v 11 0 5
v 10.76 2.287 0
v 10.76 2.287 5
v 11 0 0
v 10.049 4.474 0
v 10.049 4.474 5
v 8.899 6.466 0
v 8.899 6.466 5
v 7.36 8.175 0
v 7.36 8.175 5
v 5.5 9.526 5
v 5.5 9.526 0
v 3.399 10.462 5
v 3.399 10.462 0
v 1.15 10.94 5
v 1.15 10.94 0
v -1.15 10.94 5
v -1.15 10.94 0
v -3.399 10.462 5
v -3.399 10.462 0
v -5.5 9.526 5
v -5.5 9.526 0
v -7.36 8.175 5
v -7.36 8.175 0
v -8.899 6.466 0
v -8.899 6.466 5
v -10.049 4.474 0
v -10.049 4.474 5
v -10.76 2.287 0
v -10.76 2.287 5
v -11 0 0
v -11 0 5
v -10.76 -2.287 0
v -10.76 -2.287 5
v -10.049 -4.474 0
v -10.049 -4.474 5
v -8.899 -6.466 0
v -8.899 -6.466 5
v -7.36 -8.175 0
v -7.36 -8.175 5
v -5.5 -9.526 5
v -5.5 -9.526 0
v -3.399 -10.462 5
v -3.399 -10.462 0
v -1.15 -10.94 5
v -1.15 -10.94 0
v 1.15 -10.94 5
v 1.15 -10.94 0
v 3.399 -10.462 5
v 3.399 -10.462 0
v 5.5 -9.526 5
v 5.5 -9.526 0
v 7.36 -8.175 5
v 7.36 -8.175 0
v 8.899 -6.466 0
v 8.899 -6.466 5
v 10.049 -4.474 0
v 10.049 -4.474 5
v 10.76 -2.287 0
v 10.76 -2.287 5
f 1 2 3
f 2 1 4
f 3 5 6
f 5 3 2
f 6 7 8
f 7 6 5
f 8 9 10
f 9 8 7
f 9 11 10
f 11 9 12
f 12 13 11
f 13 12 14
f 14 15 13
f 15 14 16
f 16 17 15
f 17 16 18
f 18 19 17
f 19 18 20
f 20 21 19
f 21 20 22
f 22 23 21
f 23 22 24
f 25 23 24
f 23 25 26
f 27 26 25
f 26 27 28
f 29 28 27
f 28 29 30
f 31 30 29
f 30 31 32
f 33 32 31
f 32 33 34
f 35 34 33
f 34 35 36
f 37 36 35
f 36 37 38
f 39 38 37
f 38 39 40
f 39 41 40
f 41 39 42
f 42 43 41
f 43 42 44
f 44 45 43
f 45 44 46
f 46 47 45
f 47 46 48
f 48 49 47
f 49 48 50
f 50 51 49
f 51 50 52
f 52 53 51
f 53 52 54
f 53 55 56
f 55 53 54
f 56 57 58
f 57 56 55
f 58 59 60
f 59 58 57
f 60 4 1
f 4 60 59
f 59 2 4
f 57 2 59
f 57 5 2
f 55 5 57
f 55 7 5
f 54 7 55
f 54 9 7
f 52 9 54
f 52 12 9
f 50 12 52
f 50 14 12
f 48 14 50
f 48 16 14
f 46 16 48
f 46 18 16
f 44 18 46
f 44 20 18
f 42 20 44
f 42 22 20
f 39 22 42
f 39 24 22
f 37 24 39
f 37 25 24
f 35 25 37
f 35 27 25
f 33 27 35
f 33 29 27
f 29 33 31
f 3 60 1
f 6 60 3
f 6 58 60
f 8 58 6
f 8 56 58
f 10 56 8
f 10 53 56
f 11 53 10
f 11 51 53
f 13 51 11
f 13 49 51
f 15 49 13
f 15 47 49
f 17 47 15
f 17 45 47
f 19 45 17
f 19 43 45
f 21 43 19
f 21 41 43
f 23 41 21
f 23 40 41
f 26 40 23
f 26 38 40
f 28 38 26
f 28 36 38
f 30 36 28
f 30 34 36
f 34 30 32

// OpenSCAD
// Generated by SolidPython 1.0.1 on 2020-07-29 00:46:44


cylinder(h = 5, r1 = 11, r2 = 11);
/***********************************************
*********      SolidPython code:      **********
************************************************
 
# import packages: SolidPython
from solid import *
from solid.utils import *
from itertools import chain, combinations, permutations


class Resize:

    def __init__(self, scad_file):
        self.scad_file = scad_file
        #self.scad_file = import_scad(scad_file)
        # cone/cylinder param:
        self.r1 = 0
        self.r2 = 0
        self.h = 0
        # rectangular prism param:
        self.w = 0
        self.l = 0
        # ellipse param:
        self.r = 0

    # import OpenScad code (file name corresponds to shape)


    # classify shape + parameters
    def assign(self, param1, param2, param3):
        if self.scad_file == 'cone.scad':
            self.r1 = param1
            self.r2 = param2
            self.h = param3
        elif self.scad_file == 'cylinder.scad':
            self.r1 = param1
            self.r2 = param2
            self.h = param3
        elif self.scad_file == 'rectangularPrism.scad':
            self.h = param1
            self.l = param2
            self.w = param3
        else:
            self.r = param1
            self.h = param2

    # resize parameters
    def iterate(self):
        x = range(3, 20, 2)
        i = 1
        if self.scad_file == 'cone.scad':
            tempList = list(permutations(x, 2))
            for temp in tempList:
                param1 = temp[0]
                param2 = temp[1]
                filepath = 'produced_scad_files/' + 'cone' + str(param1) + '_' + str(param2) + '_' + '.scad'
                scad_render_to_file(cylinder(h=param1, r1=param2, r2=0), filepath)

        elif self.scad_file == 'cylinder.scad':
            tempList = list(permutations(x, 3))
            for temp in tempList:
                param1 = temp[0]
                param2 = temp[1]
                filepath = 'produced_scad_files/' + 'cylinder' + str(param1) + '_' + str(param2) + '_' + '.scad'
                scad_render_to_file(cylinder(h=param1, r1=param2, r2=param2), filepath)

        elif self.scad_file == 'rectangularPrism.scad':
            tempList = list(permutations(x, 3))
            for temp in tempList:
                param1 = temp[0]
                param2 = temp[1]
                param3 = temp[2]
                filepath = 'produced_scad_files/' + 'rectangularPrism' + str(param1) + '_' + str(param2) + '_' + str(
                    param3) + '.scad'
                scad_render_to_file(cube(size=(param1, param2, param3)), filepath)

        elif self.scad_file == 'ellipse.scad':
            tempList = list(permutations(x, 4))
            for temp in tempList:
                param1 = temp[0]
                param2 = temp[1]
                param3 = temp[2]
                param4 = temp[3]
                filepath = 'produced_scad_files/' + 'ellipse' + str(param1) + '_' + str(param2) + '_' + str(param3) + '_' + str(param4) + '.scad'
                scad_render_to_file(scale([param1, param2, param3])(sphere(r=param4)), filepath)

    def render_to_scadfile(self):
        scad_render_to_file(scad, 'example.scad') 
 
************************************************/
